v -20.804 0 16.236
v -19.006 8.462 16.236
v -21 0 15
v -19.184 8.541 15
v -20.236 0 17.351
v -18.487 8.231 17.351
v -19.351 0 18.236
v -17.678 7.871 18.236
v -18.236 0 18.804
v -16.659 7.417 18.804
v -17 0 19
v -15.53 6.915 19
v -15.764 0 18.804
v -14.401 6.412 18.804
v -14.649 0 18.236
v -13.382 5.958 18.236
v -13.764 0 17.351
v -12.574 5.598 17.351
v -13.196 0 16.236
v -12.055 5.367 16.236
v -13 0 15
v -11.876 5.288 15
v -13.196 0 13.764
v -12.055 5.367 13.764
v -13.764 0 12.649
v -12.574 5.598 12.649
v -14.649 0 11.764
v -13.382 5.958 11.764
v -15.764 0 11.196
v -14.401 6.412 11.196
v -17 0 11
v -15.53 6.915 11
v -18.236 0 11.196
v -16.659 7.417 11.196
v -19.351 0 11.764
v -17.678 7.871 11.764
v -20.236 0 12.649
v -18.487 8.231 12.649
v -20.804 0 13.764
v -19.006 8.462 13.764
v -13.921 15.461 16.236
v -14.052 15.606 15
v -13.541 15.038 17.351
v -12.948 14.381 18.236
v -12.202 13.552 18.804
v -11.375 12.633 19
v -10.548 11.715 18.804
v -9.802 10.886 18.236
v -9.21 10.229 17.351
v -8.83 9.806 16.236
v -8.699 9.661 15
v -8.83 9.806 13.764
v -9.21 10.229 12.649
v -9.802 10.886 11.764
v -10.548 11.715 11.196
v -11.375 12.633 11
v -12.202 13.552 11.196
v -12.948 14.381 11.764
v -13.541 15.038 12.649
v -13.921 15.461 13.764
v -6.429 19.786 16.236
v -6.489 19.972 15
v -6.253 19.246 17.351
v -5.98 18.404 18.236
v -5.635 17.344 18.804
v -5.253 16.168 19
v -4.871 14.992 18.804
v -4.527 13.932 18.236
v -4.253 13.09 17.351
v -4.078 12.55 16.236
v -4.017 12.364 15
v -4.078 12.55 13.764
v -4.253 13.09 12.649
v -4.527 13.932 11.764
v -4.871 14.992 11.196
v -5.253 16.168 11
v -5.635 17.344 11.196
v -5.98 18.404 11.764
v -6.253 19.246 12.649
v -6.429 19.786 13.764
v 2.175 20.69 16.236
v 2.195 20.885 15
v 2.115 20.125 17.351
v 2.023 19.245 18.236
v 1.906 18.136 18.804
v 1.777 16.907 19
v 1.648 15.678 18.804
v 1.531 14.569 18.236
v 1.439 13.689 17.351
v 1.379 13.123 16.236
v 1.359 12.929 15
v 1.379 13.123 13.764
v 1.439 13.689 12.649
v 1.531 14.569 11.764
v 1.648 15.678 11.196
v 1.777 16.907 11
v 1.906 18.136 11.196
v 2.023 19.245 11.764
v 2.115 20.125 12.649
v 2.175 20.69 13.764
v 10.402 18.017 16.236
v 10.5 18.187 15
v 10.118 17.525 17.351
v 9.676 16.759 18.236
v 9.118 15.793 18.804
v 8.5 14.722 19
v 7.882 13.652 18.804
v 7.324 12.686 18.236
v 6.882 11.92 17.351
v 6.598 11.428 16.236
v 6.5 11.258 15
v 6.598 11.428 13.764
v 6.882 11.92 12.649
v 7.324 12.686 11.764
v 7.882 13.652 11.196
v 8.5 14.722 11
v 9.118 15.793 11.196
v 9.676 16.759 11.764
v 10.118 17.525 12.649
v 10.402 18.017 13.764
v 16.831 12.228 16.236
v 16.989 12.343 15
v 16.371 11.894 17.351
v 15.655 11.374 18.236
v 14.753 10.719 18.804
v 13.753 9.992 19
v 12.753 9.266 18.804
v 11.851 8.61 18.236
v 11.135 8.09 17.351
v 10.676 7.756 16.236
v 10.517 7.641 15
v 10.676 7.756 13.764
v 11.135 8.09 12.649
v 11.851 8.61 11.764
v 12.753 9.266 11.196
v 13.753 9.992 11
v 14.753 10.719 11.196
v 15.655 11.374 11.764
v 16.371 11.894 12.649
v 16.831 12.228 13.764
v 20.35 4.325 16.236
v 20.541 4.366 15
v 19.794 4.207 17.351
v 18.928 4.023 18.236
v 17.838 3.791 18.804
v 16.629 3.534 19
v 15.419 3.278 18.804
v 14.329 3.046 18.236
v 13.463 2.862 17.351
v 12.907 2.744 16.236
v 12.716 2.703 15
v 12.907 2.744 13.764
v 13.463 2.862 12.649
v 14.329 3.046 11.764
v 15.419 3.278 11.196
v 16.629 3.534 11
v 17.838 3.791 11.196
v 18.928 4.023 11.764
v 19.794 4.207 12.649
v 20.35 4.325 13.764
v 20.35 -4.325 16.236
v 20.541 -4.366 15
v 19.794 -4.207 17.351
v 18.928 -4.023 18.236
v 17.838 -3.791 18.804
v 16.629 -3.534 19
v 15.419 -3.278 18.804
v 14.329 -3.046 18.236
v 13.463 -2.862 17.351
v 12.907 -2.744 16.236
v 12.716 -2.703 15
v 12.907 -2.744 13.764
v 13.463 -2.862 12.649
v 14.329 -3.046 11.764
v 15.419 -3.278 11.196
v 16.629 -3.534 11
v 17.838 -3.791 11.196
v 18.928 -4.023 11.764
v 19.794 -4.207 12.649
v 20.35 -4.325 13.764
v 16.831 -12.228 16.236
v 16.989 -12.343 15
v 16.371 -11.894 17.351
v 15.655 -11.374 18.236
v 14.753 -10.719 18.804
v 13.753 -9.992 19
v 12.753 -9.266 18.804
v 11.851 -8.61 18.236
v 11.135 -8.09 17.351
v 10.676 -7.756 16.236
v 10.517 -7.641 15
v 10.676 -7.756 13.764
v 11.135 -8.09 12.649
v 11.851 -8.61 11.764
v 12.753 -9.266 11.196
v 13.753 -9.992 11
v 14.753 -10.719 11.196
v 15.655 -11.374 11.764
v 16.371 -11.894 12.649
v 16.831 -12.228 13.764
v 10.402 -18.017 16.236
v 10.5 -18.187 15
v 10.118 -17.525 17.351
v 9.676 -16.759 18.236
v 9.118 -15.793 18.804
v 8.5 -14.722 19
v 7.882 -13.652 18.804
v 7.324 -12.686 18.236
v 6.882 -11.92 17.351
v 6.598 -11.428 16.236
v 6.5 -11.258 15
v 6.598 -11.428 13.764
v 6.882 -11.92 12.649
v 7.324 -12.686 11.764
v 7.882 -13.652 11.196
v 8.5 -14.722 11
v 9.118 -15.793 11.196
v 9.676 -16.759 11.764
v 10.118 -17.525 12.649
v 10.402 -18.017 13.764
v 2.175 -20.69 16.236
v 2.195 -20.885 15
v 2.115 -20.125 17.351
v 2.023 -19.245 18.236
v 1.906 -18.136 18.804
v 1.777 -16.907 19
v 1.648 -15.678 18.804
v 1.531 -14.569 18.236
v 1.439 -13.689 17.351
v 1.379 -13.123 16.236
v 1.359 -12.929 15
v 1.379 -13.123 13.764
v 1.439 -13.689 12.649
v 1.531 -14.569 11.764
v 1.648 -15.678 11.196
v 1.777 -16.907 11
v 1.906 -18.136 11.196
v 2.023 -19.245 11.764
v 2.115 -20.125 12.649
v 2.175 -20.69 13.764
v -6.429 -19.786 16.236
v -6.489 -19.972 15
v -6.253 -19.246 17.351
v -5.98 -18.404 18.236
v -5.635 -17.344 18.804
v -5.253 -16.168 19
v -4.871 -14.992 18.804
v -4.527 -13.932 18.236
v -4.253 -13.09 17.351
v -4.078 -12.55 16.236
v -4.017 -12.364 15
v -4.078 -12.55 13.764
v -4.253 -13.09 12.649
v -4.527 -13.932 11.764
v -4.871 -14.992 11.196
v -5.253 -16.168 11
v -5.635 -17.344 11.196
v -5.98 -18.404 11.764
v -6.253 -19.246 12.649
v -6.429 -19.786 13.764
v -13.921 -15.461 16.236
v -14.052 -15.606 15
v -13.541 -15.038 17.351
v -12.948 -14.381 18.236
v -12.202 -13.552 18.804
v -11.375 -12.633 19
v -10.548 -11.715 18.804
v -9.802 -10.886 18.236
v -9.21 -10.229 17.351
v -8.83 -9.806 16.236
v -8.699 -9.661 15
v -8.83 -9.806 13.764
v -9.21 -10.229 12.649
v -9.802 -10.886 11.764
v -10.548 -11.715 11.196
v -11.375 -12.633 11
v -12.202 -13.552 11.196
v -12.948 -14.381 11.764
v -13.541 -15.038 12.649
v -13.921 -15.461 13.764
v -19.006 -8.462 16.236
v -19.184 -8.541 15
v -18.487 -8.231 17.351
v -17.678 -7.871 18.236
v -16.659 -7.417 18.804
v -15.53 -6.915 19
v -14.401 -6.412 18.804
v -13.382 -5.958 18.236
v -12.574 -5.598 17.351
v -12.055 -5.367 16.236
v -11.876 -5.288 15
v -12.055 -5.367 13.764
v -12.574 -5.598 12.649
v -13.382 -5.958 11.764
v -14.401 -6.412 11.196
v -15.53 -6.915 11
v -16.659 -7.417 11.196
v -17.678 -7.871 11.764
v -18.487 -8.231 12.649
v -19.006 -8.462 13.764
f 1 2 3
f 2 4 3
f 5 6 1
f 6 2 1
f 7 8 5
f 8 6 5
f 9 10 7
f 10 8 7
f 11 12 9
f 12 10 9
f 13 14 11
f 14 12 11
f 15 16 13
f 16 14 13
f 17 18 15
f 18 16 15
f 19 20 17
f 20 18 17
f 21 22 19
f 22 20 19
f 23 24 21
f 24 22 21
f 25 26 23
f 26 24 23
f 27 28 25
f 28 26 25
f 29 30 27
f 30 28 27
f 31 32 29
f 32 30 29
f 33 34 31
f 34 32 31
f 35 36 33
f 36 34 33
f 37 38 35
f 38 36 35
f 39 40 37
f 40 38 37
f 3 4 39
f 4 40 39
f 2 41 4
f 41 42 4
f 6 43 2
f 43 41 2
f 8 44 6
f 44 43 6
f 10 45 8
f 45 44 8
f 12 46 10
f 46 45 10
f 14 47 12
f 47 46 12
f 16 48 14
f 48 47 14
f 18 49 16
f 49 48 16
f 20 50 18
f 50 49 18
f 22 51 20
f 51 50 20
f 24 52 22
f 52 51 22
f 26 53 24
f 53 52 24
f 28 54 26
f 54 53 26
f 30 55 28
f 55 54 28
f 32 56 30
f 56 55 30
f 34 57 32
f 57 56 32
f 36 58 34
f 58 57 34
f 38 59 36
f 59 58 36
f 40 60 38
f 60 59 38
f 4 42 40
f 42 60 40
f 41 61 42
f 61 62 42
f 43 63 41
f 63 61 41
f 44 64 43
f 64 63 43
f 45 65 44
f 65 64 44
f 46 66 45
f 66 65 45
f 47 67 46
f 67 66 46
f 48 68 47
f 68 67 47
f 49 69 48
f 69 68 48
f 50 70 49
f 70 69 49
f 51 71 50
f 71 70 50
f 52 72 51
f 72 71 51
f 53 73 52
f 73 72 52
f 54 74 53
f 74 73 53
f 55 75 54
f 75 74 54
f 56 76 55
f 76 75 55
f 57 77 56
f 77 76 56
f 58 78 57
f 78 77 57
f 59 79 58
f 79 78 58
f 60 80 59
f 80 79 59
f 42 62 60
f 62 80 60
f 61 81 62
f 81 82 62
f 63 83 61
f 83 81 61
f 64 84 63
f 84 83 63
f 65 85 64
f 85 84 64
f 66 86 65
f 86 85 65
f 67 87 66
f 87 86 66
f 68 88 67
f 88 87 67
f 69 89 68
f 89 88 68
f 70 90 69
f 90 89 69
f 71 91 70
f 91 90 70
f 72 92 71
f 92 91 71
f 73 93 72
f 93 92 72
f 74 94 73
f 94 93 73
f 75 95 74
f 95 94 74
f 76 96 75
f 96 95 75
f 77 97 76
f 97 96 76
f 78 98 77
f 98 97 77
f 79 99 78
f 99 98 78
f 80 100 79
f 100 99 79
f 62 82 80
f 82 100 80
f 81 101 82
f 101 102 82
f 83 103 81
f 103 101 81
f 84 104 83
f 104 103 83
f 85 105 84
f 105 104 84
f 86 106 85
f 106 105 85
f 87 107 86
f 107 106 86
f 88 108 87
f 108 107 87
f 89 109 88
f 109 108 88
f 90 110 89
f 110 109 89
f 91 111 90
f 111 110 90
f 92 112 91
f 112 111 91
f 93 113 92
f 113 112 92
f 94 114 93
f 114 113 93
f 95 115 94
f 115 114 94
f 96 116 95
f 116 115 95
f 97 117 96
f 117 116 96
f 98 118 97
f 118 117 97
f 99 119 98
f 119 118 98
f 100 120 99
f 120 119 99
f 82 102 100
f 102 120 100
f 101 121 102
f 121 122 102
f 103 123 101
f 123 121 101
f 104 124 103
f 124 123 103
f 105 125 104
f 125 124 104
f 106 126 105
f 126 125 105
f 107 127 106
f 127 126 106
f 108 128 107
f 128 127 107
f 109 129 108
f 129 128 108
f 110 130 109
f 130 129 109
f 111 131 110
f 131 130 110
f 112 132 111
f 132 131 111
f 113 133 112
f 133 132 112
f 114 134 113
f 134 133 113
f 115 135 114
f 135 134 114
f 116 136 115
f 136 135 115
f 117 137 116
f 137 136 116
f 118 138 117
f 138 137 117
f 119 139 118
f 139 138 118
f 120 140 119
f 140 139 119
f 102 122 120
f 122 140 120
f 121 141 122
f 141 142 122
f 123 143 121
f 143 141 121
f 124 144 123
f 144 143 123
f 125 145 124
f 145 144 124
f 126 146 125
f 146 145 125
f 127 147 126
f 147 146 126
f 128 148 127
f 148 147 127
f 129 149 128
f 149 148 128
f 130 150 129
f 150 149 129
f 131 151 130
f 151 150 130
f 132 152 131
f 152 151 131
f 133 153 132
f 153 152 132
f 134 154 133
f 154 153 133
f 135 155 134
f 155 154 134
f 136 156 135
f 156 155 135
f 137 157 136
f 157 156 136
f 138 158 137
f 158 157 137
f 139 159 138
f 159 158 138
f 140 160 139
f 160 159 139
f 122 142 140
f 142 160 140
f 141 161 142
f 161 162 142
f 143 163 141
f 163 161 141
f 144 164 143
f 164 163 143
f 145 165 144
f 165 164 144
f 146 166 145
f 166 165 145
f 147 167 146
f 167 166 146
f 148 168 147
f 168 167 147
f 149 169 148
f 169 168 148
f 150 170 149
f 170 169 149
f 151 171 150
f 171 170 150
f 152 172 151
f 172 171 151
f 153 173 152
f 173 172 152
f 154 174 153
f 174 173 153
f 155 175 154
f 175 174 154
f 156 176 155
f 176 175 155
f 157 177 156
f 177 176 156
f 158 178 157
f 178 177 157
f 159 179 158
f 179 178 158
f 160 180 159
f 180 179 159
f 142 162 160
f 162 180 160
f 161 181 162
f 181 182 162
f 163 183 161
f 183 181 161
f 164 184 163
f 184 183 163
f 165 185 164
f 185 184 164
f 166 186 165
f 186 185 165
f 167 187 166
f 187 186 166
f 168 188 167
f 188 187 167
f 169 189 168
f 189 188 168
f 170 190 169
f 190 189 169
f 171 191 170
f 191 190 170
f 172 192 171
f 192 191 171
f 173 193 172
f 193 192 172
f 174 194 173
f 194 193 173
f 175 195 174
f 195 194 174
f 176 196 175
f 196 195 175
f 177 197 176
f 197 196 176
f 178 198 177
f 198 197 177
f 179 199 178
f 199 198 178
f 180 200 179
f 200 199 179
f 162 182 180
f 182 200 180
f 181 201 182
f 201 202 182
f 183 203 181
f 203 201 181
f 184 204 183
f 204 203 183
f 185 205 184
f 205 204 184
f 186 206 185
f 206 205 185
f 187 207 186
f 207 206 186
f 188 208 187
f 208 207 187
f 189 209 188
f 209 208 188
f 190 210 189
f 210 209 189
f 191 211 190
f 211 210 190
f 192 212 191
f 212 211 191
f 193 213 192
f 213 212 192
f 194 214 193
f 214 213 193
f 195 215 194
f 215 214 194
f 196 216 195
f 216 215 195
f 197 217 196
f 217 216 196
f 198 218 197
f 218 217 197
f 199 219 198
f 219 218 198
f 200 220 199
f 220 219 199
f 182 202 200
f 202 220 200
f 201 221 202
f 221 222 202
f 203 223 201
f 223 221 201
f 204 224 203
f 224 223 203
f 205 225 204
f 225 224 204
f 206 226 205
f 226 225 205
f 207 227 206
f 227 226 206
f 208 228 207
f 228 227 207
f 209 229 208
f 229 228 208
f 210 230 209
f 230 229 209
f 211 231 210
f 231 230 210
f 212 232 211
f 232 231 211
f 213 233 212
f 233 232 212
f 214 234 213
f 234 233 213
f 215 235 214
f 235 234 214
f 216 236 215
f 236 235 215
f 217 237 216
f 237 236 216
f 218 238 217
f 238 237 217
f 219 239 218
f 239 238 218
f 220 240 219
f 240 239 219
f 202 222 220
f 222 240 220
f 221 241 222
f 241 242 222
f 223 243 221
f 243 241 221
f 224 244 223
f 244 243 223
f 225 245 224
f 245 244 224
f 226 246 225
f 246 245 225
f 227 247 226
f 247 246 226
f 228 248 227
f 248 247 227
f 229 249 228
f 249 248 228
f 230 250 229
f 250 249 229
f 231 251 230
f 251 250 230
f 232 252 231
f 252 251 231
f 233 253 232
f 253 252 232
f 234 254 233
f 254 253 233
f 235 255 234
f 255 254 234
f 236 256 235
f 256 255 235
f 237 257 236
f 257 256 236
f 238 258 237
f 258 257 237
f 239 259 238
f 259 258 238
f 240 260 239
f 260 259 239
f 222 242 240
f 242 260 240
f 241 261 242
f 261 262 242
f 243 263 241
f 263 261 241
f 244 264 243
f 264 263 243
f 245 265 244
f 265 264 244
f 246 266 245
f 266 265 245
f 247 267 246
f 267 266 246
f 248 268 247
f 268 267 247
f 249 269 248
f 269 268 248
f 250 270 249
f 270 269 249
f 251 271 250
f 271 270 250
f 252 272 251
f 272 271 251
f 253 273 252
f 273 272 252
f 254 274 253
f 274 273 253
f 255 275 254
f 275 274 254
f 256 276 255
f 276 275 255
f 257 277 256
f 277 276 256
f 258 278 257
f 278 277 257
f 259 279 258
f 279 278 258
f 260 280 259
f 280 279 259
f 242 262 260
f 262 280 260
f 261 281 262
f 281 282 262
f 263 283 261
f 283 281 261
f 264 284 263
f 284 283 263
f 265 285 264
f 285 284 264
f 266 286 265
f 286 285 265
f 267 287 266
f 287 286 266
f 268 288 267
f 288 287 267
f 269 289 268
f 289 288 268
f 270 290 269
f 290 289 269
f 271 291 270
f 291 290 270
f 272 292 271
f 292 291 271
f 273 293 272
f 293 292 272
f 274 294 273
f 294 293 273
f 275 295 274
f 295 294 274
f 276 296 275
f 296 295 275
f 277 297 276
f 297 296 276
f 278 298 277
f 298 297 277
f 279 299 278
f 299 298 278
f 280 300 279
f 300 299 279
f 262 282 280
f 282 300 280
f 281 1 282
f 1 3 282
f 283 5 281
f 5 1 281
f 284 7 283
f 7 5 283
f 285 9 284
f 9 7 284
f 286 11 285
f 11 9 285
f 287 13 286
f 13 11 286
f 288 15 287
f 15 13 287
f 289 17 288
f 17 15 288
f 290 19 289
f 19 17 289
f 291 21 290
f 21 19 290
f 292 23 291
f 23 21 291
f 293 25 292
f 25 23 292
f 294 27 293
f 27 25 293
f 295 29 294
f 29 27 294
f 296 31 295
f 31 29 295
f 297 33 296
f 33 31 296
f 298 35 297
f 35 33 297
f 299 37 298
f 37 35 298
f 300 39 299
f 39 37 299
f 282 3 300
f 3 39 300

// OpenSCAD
$fn=15;

module groove(){
	translate([0,0,15]){
		rotate_extrude(convexity = 10)
		translate([17,0,0])
		circle(r = 4, $fn=20);
	}
}

groove();
